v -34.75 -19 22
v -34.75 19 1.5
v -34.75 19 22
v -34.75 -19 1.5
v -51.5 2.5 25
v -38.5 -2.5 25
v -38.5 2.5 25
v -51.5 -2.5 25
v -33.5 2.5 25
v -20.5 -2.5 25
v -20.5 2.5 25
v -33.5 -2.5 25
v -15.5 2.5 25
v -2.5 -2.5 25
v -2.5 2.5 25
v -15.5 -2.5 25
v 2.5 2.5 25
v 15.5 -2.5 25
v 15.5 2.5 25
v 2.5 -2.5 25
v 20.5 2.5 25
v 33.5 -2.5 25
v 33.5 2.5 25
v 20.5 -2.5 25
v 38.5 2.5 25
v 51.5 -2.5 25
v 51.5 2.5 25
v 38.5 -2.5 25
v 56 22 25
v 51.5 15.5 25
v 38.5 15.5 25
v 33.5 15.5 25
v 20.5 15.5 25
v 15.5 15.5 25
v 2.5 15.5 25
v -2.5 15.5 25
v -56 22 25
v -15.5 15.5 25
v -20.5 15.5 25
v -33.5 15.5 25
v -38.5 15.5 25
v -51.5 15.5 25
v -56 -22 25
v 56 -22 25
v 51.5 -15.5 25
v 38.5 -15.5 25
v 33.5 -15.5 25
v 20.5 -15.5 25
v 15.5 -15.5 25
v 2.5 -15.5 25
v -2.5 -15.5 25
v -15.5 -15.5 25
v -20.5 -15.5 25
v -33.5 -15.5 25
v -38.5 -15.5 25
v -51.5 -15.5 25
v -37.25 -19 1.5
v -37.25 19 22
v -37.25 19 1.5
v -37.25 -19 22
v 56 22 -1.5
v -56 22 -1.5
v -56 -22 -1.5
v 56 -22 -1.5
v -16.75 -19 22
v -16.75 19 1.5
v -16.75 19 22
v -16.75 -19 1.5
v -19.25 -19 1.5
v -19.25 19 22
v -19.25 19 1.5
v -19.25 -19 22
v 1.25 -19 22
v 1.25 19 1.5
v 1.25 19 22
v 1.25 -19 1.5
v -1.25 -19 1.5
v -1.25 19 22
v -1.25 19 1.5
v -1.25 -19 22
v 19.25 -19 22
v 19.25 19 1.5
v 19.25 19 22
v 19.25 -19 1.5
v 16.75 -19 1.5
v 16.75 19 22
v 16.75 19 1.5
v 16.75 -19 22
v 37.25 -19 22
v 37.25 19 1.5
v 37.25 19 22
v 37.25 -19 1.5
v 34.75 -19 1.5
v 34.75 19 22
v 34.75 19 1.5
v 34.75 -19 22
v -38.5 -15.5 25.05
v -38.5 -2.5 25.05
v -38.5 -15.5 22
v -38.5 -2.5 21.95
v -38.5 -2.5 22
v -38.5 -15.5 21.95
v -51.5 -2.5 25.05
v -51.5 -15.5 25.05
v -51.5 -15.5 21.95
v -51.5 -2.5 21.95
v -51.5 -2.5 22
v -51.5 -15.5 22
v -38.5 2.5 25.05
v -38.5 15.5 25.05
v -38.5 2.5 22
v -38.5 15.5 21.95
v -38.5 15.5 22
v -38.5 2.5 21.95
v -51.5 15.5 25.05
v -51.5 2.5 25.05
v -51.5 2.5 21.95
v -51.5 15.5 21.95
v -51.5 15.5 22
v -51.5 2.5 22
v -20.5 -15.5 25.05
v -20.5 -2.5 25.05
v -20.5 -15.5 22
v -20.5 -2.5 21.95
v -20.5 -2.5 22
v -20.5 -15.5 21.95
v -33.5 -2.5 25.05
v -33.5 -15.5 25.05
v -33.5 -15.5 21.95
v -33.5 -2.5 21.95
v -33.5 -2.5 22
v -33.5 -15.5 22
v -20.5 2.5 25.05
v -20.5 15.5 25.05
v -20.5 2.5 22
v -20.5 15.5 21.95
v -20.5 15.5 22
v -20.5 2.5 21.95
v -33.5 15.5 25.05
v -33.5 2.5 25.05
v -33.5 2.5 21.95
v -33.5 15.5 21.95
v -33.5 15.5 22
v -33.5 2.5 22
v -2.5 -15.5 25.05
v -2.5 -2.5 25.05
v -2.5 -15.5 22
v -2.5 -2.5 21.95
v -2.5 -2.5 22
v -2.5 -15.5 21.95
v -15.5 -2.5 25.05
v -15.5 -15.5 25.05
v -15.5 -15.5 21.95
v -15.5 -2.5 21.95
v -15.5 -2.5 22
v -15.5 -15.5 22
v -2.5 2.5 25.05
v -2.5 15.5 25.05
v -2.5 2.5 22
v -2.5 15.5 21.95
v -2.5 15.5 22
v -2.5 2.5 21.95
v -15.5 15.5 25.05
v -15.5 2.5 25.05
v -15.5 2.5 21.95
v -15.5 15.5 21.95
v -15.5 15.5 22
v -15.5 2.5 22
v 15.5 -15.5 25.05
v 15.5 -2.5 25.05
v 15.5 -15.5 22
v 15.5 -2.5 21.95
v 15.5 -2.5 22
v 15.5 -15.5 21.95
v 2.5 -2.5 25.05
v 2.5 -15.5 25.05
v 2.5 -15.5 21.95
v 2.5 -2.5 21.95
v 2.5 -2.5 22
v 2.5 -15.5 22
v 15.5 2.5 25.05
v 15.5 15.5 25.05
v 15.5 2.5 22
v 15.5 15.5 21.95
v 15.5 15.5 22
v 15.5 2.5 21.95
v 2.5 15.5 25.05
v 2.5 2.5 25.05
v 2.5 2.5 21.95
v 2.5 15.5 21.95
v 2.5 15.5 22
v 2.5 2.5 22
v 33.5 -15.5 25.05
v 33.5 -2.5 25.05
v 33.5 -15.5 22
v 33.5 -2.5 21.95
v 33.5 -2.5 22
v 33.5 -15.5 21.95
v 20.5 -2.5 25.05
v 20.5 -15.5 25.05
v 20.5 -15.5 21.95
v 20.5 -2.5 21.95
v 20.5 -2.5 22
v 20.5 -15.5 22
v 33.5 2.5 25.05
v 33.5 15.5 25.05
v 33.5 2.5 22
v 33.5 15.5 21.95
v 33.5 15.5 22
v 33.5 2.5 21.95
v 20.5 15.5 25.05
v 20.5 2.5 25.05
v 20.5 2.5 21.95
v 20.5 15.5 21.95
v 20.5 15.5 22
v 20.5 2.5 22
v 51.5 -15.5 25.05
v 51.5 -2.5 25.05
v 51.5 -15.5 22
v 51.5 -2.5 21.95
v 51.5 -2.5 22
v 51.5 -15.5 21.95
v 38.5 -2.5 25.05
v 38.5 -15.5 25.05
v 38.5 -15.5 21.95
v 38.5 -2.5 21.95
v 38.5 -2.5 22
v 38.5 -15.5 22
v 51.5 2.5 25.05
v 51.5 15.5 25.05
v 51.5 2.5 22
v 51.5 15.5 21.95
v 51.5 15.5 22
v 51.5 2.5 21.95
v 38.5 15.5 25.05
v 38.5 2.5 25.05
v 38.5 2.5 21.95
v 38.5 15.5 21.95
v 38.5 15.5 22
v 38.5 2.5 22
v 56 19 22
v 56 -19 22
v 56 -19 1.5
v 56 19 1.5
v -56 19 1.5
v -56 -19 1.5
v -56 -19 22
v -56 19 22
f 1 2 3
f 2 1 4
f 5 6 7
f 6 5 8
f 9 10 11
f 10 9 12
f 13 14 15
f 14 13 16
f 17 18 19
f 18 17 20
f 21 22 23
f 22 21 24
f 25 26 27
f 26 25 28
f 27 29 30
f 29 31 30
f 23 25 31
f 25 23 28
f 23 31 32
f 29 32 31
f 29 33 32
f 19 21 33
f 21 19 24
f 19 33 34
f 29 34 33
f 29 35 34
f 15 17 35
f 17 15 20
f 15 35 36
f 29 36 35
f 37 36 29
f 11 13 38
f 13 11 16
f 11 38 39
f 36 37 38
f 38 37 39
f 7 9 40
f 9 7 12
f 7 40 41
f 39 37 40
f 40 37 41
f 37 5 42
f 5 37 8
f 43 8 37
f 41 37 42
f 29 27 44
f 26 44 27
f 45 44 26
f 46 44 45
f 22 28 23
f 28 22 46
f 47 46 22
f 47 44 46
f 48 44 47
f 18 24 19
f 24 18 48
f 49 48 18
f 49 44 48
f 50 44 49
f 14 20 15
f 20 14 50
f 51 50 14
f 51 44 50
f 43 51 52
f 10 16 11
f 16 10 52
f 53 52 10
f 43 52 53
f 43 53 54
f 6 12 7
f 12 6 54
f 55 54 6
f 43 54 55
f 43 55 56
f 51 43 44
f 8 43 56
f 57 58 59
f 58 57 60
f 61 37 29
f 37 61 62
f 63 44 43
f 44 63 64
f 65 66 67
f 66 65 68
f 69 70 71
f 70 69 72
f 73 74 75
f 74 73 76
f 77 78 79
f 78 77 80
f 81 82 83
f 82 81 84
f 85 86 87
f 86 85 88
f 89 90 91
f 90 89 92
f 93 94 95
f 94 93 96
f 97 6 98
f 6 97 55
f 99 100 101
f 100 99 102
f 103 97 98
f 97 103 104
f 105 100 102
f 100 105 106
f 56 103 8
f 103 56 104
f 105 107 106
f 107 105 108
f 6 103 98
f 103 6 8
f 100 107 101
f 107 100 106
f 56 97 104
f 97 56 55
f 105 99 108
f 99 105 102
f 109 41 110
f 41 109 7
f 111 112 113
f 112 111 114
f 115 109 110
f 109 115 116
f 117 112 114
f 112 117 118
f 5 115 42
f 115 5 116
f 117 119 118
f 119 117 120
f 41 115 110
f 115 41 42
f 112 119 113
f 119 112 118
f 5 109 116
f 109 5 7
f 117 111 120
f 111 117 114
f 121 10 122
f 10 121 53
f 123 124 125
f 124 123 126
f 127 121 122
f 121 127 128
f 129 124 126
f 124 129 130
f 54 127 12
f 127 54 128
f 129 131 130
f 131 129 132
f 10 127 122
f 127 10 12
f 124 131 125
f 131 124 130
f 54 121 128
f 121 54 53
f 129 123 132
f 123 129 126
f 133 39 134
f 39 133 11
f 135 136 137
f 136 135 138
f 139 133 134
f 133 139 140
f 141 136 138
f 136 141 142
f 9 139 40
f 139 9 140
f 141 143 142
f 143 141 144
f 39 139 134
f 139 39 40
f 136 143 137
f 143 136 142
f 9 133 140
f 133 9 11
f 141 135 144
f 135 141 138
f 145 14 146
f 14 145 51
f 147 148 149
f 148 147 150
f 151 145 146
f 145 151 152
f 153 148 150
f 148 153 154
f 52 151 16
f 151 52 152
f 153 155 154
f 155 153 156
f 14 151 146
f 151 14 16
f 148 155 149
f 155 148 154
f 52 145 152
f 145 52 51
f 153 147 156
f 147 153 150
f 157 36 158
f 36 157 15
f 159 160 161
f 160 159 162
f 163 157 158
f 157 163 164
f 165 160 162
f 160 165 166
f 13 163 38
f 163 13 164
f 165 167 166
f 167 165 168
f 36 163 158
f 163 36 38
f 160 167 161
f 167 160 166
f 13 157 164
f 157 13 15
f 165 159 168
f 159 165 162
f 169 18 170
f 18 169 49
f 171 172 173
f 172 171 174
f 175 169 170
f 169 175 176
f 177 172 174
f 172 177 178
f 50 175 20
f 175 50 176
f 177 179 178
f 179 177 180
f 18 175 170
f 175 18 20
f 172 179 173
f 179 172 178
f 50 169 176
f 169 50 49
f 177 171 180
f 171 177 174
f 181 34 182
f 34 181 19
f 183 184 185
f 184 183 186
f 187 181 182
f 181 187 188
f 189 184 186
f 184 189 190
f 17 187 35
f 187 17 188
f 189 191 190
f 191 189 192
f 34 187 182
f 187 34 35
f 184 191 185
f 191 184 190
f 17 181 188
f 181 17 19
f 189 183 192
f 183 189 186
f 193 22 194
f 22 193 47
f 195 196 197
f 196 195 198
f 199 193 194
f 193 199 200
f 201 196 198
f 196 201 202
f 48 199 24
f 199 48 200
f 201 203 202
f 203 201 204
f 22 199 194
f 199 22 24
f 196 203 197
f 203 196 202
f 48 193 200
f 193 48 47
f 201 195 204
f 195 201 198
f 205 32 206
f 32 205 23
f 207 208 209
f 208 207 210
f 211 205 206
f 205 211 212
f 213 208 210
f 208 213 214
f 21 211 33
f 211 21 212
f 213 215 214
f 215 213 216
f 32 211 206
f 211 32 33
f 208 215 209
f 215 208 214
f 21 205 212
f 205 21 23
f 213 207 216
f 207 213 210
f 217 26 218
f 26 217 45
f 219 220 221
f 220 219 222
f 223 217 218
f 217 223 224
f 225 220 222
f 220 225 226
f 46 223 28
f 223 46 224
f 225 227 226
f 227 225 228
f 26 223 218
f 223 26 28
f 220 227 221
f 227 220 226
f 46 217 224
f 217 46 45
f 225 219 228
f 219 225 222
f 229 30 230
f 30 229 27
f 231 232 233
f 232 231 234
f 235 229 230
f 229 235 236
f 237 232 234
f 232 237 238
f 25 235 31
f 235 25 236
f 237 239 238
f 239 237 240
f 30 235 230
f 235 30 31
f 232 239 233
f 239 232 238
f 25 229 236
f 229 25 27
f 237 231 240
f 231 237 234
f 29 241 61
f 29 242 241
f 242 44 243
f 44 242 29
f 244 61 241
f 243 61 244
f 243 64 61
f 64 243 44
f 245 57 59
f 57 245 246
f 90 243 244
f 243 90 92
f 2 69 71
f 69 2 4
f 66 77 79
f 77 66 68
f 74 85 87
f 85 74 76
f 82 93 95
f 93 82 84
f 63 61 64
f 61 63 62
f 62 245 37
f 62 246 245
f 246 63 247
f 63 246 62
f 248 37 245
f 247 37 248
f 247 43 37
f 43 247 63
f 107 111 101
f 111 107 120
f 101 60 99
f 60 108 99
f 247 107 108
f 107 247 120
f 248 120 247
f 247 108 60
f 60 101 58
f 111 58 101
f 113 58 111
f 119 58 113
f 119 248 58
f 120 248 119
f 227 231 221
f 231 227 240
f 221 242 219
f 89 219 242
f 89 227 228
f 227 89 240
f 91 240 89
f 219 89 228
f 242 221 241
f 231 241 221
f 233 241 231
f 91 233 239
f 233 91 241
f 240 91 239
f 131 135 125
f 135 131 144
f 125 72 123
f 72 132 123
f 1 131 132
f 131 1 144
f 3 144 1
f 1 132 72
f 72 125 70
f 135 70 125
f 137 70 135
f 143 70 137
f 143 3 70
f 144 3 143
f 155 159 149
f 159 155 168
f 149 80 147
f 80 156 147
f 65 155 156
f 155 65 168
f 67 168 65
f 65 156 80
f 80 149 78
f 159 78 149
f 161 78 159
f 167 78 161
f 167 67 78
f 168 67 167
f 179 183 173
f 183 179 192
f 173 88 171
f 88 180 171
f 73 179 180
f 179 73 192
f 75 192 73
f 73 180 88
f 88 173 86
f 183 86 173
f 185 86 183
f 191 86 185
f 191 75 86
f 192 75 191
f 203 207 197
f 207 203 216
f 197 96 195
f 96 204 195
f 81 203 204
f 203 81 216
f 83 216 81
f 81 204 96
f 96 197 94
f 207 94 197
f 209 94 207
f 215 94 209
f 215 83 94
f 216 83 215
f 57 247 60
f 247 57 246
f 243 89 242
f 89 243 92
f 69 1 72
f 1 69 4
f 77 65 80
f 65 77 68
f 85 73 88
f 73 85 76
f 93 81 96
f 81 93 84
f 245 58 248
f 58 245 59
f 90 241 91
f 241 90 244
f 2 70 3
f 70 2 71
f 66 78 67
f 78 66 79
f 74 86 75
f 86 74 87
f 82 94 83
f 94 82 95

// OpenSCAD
// Cuvette Rack Dimensions
base_x = 112;
base_y = 44;
base_z = 3;
deck_z_start = 22;
deck_z_end = 25;
deck_thickness = deck_z_end - deck_z_start;
wall_thickness_end = 3;
wall_thickness_rib = 2.5;
wall_height = 25;
rib_positions = [-36, -18, 0, 18, 36];
hole_size = 13;
hole_spacing = 18;
num_holes_x = 6;
num_holes_y = 2;

// Render settings
$fn = 64;

// Base Plate
translate([0, 0, 0])
    cube([base_x, base_y, base_z], center = true);

// Deck Plate
translate([0, 0, deck_z_start + deck_thickness/2])
    cube([base_x, base_y, deck_thickness], center = true);

// End Walls (flush with short ends, Y direction)
// Left end wall at y = -base_y/2
translate([0, -base_y/2 + wall_thickness_end/2, wall_height/2])
    cube([base_x, wall_thickness_end, wall_height], center = true);

// Right end wall at y = base_y/2
translate([0, base_y/2 - wall_thickness_end/2, wall_height/2])
    cube([base_x, wall_thickness_end, wall_height], center = true);

// Ribs (5 ribs at specified X positions)
for (x_pos = rib_positions) {
    translate([x_pos, 0, wall_height/2])
        cube([wall_thickness_rib, base_y, wall_height], center = true);
}

// Holes in Deck Plate
// 2 rows along Y, 6 columns along X
// Centred on deck, 18 mm spacing
for (i = [0 : num_holes_x - 1]) {
    for (j = [0 : num_holes_y - 1]) {
        x_offset = (i - (num_holes_x - 1) / 2) * hole_spacing;
        y_offset = (j - (num_holes_y - 1) / 2) * hole_spacing;
        
        translate([x_offset, y_offset, deck_z_start + deck_thickness/2])
            cube([hole_size, hole_size, deck_thickness + 0.1], center = true);
    }
}
